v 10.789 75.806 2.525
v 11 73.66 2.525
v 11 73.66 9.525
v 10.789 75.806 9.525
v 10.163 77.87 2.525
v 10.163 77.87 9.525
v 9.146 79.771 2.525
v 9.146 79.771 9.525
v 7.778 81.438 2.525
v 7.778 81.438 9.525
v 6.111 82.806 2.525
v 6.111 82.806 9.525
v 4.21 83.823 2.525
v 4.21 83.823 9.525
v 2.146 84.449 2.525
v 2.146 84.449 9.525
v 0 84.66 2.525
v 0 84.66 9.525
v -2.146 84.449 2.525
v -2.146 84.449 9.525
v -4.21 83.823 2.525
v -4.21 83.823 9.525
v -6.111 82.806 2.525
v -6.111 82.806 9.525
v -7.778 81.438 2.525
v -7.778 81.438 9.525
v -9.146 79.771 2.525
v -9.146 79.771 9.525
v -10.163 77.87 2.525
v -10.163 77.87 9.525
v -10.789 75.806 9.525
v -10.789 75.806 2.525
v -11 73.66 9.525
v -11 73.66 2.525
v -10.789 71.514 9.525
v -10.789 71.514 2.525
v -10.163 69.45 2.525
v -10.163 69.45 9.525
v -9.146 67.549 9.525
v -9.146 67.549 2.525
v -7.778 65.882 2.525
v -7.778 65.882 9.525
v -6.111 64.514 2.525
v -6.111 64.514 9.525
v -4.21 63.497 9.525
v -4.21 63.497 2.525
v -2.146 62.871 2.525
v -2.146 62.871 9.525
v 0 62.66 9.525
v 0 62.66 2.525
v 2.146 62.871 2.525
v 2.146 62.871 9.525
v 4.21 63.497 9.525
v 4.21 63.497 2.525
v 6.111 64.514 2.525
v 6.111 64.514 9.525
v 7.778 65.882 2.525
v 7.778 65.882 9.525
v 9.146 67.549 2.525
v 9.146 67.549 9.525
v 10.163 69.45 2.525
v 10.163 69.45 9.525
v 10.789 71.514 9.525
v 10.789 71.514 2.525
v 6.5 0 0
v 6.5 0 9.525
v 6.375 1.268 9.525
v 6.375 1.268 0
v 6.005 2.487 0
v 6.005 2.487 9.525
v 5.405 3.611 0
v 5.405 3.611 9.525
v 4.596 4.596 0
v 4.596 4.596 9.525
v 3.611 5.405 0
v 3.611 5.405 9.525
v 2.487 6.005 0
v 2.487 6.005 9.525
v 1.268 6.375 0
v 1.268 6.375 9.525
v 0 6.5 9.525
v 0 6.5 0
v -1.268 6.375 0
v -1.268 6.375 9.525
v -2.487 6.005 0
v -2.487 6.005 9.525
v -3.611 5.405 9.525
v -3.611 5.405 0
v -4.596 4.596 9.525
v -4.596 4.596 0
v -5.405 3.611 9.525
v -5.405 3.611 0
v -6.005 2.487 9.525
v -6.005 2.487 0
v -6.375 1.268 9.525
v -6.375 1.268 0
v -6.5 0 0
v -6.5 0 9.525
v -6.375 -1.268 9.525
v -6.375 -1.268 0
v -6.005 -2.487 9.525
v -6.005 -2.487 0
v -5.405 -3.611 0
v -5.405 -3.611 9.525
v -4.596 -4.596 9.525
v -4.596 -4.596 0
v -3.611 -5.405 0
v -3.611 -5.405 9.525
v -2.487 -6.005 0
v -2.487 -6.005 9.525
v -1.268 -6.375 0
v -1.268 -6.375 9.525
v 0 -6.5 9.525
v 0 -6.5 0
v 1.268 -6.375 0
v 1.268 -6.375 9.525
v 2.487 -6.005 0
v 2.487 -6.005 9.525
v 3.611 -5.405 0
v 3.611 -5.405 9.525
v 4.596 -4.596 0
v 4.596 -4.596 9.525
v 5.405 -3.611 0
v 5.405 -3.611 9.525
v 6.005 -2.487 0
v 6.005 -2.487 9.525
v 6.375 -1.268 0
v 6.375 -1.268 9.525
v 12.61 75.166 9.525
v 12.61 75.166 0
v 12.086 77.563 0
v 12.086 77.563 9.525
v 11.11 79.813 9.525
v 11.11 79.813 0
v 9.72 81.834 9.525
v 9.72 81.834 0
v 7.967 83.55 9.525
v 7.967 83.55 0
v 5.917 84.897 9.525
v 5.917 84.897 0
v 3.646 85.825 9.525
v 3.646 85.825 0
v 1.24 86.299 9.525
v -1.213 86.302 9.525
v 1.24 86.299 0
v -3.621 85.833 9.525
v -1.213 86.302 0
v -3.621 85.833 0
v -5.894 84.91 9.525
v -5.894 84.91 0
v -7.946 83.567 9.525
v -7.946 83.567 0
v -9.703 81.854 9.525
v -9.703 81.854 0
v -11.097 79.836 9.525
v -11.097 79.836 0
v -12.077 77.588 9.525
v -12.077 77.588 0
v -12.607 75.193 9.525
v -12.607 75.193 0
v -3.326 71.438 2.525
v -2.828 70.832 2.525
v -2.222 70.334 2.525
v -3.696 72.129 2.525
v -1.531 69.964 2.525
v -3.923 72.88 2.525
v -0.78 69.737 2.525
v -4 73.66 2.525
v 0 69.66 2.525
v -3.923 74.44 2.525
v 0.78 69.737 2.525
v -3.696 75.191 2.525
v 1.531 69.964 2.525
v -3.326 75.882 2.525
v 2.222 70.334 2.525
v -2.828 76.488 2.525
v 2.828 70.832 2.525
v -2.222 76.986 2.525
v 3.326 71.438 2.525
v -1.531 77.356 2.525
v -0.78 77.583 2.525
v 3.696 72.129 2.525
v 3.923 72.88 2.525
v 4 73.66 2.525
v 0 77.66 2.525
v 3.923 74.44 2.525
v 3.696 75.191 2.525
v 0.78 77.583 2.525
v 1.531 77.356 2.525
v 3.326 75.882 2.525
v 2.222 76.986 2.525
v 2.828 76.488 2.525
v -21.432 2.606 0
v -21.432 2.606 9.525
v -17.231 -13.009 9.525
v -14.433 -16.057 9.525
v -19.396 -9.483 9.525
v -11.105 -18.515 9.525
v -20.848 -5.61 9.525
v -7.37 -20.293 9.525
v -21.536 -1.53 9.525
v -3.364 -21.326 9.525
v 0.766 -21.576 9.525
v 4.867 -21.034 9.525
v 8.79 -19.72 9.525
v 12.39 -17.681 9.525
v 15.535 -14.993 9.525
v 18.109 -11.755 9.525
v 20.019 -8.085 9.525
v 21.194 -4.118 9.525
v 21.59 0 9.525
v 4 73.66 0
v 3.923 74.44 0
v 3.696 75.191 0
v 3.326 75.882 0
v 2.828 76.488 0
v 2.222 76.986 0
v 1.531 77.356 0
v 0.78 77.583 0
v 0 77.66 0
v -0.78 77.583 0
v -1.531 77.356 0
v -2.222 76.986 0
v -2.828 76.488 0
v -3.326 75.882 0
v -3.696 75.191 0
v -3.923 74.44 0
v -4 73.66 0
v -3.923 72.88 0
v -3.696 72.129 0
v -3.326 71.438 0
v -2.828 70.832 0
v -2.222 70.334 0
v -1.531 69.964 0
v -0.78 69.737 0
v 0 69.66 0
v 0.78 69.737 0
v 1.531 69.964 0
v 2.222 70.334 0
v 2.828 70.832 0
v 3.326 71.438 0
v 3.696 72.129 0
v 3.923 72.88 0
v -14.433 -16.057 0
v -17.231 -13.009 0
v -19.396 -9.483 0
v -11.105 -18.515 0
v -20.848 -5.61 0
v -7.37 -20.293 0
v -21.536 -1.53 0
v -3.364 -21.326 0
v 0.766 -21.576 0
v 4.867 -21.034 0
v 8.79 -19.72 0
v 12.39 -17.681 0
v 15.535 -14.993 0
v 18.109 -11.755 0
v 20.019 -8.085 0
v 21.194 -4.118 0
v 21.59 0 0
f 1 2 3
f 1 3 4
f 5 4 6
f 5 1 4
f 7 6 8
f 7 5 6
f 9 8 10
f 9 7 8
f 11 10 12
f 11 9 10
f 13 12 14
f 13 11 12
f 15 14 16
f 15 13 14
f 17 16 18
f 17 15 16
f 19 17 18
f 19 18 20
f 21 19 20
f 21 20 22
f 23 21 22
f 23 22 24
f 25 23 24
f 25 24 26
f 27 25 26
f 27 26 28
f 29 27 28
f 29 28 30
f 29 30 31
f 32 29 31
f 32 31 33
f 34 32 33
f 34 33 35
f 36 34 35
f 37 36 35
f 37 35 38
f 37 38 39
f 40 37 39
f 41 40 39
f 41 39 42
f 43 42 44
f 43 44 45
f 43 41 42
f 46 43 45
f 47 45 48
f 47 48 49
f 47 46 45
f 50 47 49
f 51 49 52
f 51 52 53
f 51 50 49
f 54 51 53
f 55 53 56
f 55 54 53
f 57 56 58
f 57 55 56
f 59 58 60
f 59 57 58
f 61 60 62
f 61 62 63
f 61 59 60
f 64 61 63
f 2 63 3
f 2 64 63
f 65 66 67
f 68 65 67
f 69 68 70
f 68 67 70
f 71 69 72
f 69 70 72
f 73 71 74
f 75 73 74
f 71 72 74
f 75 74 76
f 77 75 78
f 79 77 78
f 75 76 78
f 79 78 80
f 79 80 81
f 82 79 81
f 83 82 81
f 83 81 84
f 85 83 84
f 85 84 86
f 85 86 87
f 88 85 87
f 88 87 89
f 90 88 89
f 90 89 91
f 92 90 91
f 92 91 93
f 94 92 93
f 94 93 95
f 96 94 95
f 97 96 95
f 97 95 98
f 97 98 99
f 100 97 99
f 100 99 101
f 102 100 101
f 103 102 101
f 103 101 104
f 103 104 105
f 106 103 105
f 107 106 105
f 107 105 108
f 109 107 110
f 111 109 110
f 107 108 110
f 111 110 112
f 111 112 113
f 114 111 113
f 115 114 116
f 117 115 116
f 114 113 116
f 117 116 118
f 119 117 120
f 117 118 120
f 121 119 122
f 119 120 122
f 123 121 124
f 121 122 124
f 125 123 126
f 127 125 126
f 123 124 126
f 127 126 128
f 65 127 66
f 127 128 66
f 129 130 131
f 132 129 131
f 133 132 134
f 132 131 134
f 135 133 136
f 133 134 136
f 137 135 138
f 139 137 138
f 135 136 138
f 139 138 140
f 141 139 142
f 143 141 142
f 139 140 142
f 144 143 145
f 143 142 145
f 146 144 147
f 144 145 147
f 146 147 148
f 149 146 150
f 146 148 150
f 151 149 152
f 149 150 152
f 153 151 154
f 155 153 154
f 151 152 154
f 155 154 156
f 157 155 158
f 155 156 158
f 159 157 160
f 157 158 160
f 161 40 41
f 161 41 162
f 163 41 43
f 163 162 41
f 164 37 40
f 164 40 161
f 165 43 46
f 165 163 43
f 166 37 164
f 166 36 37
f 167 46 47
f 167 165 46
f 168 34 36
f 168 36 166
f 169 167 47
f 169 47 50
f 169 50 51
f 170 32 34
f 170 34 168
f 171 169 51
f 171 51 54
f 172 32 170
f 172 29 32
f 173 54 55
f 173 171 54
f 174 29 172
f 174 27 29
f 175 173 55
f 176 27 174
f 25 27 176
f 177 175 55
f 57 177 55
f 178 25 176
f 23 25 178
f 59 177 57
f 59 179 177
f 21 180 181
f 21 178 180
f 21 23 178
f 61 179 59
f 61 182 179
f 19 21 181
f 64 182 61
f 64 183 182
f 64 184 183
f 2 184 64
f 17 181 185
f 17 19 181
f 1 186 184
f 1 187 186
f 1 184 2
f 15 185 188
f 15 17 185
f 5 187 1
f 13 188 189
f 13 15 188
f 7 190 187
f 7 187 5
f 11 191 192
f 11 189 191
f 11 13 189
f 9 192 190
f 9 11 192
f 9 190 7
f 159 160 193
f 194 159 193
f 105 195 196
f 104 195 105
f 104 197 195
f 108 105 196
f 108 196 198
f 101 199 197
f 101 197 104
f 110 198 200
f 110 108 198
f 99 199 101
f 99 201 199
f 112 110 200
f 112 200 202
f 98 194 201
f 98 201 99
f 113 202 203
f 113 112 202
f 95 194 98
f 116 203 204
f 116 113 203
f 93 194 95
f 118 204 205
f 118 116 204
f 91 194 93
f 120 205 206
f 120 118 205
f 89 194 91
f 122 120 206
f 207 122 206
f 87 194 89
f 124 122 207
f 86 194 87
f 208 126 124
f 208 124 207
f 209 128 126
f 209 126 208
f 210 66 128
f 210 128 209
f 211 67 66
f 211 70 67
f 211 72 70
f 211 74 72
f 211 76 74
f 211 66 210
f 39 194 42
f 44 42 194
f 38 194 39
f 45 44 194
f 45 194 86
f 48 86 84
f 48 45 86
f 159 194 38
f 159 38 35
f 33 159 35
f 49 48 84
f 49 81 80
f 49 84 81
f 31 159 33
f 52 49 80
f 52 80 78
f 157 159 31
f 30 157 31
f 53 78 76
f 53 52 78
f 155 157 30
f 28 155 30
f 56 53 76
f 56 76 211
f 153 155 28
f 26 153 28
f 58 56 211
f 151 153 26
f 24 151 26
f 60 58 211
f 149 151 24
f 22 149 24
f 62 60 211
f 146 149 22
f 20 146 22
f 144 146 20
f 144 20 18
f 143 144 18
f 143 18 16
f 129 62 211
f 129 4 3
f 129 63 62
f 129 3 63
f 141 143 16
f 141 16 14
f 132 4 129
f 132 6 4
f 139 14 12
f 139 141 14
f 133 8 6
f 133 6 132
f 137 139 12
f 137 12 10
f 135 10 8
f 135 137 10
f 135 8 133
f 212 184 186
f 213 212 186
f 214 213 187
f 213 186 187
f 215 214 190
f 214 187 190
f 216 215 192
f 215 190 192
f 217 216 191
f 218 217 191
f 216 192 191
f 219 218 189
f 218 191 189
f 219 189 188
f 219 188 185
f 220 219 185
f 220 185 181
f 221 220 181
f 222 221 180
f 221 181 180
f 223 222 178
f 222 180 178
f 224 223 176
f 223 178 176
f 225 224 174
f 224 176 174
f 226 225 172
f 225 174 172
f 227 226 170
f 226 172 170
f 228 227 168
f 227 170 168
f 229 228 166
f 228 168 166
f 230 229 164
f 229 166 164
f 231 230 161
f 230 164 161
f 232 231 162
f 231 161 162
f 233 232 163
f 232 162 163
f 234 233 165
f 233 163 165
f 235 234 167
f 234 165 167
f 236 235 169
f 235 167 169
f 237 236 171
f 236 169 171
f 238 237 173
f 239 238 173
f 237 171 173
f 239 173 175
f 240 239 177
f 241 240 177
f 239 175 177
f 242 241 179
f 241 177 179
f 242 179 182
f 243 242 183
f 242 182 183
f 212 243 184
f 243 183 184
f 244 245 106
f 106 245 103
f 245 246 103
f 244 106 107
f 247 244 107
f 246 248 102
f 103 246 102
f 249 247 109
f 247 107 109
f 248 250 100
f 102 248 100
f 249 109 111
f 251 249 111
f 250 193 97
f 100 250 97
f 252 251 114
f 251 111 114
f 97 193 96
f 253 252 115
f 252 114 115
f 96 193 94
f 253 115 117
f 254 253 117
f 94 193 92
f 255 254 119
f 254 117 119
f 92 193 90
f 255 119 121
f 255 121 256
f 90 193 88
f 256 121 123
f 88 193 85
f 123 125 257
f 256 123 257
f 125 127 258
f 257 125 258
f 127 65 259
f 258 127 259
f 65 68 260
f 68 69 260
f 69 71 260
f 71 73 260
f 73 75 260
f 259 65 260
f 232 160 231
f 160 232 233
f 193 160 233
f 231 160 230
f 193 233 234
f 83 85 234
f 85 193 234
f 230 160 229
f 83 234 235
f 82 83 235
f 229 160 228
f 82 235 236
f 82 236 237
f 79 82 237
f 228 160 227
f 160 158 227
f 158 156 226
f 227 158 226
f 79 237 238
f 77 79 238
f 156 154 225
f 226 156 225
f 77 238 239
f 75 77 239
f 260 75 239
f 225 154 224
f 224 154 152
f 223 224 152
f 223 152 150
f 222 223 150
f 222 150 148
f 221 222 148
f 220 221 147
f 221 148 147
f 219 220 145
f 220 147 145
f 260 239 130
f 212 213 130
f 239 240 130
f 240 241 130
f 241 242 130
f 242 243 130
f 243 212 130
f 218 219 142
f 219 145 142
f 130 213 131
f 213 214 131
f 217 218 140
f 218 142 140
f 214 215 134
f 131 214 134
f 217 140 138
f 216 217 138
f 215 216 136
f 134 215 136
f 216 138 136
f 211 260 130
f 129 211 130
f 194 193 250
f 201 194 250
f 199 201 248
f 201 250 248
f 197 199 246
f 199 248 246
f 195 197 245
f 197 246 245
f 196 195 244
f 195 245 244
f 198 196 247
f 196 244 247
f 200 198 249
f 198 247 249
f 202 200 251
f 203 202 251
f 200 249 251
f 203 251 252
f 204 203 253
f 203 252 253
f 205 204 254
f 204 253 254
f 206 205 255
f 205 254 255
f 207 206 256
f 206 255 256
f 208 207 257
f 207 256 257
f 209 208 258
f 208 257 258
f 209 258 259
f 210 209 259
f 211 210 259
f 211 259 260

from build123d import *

# Parameters (mm, degrees)
SKETCH1_R           = 11
BOSS_EXTRUDE1_DEPTH = 9.525
SKETCH1_3_R         = 11
BOSS_EXTRUDE2_DEPTH = 2.52476
SKETCH2_R           = 4
CUT_EXTRUDE1_DEPTH  = 2.52476
SKETCH3_R           = 6.5
CUT_EXTRUDE2_DEPTH  = 10.525


with BuildPart() as part:
    # Sketch1 → Boss-Extrude1 (new body)
    with BuildSketch(Plane.XY):
        with BuildLine():
            ThreePointArc((12.610334109, 75.166477239), (0.013235783, 86.359993103), (-12.607166653, 75.192758621))
            Line((-12.607166653, 75.192758621), (-21.43218331, 2.605689655))
            ThreePointArc((-21.43218331, 2.605689655), (-1.305232229, -21.550509712), (21.59, 0))
            Line((21.59, 0), (12.610334109, 75.166477239))
        make_face()
        with Locations((0, 73.66)):
            Circle(SKETCH1_R, mode=Mode.SUBTRACT)
    extrude(amount=BOSS_EXTRUDE1_DEPTH)

    # Sketch1<3> → Boss-Extrude2 (add)
    with BuildSketch(Plane.XY):
        with Locations((0, 73.66)):
            Circle(SKETCH1_3_R)
    extrude(amount=BOSS_EXTRUDE2_DEPTH)

    # Sketch2 → Cut-Extrude1 (cut)
    with BuildSketch(Plane.XY.offset(2.52476)):
        with Locations((0, 73.66)):
            Circle(SKETCH2_R)
    extrude(amount=-CUT_EXTRUDE1_DEPTH, mode=Mode.SUBTRACT)

    # Sketch3 → Cut-Extrude2 (cut, through all)
    with BuildSketch(Plane.XY.offset(9.525)):
        Circle(SKETCH3_R)
    extrude(amount=-CUT_EXTRUDE2_DEPTH, mode=Mode.SUBTRACT)


solid = part.part
